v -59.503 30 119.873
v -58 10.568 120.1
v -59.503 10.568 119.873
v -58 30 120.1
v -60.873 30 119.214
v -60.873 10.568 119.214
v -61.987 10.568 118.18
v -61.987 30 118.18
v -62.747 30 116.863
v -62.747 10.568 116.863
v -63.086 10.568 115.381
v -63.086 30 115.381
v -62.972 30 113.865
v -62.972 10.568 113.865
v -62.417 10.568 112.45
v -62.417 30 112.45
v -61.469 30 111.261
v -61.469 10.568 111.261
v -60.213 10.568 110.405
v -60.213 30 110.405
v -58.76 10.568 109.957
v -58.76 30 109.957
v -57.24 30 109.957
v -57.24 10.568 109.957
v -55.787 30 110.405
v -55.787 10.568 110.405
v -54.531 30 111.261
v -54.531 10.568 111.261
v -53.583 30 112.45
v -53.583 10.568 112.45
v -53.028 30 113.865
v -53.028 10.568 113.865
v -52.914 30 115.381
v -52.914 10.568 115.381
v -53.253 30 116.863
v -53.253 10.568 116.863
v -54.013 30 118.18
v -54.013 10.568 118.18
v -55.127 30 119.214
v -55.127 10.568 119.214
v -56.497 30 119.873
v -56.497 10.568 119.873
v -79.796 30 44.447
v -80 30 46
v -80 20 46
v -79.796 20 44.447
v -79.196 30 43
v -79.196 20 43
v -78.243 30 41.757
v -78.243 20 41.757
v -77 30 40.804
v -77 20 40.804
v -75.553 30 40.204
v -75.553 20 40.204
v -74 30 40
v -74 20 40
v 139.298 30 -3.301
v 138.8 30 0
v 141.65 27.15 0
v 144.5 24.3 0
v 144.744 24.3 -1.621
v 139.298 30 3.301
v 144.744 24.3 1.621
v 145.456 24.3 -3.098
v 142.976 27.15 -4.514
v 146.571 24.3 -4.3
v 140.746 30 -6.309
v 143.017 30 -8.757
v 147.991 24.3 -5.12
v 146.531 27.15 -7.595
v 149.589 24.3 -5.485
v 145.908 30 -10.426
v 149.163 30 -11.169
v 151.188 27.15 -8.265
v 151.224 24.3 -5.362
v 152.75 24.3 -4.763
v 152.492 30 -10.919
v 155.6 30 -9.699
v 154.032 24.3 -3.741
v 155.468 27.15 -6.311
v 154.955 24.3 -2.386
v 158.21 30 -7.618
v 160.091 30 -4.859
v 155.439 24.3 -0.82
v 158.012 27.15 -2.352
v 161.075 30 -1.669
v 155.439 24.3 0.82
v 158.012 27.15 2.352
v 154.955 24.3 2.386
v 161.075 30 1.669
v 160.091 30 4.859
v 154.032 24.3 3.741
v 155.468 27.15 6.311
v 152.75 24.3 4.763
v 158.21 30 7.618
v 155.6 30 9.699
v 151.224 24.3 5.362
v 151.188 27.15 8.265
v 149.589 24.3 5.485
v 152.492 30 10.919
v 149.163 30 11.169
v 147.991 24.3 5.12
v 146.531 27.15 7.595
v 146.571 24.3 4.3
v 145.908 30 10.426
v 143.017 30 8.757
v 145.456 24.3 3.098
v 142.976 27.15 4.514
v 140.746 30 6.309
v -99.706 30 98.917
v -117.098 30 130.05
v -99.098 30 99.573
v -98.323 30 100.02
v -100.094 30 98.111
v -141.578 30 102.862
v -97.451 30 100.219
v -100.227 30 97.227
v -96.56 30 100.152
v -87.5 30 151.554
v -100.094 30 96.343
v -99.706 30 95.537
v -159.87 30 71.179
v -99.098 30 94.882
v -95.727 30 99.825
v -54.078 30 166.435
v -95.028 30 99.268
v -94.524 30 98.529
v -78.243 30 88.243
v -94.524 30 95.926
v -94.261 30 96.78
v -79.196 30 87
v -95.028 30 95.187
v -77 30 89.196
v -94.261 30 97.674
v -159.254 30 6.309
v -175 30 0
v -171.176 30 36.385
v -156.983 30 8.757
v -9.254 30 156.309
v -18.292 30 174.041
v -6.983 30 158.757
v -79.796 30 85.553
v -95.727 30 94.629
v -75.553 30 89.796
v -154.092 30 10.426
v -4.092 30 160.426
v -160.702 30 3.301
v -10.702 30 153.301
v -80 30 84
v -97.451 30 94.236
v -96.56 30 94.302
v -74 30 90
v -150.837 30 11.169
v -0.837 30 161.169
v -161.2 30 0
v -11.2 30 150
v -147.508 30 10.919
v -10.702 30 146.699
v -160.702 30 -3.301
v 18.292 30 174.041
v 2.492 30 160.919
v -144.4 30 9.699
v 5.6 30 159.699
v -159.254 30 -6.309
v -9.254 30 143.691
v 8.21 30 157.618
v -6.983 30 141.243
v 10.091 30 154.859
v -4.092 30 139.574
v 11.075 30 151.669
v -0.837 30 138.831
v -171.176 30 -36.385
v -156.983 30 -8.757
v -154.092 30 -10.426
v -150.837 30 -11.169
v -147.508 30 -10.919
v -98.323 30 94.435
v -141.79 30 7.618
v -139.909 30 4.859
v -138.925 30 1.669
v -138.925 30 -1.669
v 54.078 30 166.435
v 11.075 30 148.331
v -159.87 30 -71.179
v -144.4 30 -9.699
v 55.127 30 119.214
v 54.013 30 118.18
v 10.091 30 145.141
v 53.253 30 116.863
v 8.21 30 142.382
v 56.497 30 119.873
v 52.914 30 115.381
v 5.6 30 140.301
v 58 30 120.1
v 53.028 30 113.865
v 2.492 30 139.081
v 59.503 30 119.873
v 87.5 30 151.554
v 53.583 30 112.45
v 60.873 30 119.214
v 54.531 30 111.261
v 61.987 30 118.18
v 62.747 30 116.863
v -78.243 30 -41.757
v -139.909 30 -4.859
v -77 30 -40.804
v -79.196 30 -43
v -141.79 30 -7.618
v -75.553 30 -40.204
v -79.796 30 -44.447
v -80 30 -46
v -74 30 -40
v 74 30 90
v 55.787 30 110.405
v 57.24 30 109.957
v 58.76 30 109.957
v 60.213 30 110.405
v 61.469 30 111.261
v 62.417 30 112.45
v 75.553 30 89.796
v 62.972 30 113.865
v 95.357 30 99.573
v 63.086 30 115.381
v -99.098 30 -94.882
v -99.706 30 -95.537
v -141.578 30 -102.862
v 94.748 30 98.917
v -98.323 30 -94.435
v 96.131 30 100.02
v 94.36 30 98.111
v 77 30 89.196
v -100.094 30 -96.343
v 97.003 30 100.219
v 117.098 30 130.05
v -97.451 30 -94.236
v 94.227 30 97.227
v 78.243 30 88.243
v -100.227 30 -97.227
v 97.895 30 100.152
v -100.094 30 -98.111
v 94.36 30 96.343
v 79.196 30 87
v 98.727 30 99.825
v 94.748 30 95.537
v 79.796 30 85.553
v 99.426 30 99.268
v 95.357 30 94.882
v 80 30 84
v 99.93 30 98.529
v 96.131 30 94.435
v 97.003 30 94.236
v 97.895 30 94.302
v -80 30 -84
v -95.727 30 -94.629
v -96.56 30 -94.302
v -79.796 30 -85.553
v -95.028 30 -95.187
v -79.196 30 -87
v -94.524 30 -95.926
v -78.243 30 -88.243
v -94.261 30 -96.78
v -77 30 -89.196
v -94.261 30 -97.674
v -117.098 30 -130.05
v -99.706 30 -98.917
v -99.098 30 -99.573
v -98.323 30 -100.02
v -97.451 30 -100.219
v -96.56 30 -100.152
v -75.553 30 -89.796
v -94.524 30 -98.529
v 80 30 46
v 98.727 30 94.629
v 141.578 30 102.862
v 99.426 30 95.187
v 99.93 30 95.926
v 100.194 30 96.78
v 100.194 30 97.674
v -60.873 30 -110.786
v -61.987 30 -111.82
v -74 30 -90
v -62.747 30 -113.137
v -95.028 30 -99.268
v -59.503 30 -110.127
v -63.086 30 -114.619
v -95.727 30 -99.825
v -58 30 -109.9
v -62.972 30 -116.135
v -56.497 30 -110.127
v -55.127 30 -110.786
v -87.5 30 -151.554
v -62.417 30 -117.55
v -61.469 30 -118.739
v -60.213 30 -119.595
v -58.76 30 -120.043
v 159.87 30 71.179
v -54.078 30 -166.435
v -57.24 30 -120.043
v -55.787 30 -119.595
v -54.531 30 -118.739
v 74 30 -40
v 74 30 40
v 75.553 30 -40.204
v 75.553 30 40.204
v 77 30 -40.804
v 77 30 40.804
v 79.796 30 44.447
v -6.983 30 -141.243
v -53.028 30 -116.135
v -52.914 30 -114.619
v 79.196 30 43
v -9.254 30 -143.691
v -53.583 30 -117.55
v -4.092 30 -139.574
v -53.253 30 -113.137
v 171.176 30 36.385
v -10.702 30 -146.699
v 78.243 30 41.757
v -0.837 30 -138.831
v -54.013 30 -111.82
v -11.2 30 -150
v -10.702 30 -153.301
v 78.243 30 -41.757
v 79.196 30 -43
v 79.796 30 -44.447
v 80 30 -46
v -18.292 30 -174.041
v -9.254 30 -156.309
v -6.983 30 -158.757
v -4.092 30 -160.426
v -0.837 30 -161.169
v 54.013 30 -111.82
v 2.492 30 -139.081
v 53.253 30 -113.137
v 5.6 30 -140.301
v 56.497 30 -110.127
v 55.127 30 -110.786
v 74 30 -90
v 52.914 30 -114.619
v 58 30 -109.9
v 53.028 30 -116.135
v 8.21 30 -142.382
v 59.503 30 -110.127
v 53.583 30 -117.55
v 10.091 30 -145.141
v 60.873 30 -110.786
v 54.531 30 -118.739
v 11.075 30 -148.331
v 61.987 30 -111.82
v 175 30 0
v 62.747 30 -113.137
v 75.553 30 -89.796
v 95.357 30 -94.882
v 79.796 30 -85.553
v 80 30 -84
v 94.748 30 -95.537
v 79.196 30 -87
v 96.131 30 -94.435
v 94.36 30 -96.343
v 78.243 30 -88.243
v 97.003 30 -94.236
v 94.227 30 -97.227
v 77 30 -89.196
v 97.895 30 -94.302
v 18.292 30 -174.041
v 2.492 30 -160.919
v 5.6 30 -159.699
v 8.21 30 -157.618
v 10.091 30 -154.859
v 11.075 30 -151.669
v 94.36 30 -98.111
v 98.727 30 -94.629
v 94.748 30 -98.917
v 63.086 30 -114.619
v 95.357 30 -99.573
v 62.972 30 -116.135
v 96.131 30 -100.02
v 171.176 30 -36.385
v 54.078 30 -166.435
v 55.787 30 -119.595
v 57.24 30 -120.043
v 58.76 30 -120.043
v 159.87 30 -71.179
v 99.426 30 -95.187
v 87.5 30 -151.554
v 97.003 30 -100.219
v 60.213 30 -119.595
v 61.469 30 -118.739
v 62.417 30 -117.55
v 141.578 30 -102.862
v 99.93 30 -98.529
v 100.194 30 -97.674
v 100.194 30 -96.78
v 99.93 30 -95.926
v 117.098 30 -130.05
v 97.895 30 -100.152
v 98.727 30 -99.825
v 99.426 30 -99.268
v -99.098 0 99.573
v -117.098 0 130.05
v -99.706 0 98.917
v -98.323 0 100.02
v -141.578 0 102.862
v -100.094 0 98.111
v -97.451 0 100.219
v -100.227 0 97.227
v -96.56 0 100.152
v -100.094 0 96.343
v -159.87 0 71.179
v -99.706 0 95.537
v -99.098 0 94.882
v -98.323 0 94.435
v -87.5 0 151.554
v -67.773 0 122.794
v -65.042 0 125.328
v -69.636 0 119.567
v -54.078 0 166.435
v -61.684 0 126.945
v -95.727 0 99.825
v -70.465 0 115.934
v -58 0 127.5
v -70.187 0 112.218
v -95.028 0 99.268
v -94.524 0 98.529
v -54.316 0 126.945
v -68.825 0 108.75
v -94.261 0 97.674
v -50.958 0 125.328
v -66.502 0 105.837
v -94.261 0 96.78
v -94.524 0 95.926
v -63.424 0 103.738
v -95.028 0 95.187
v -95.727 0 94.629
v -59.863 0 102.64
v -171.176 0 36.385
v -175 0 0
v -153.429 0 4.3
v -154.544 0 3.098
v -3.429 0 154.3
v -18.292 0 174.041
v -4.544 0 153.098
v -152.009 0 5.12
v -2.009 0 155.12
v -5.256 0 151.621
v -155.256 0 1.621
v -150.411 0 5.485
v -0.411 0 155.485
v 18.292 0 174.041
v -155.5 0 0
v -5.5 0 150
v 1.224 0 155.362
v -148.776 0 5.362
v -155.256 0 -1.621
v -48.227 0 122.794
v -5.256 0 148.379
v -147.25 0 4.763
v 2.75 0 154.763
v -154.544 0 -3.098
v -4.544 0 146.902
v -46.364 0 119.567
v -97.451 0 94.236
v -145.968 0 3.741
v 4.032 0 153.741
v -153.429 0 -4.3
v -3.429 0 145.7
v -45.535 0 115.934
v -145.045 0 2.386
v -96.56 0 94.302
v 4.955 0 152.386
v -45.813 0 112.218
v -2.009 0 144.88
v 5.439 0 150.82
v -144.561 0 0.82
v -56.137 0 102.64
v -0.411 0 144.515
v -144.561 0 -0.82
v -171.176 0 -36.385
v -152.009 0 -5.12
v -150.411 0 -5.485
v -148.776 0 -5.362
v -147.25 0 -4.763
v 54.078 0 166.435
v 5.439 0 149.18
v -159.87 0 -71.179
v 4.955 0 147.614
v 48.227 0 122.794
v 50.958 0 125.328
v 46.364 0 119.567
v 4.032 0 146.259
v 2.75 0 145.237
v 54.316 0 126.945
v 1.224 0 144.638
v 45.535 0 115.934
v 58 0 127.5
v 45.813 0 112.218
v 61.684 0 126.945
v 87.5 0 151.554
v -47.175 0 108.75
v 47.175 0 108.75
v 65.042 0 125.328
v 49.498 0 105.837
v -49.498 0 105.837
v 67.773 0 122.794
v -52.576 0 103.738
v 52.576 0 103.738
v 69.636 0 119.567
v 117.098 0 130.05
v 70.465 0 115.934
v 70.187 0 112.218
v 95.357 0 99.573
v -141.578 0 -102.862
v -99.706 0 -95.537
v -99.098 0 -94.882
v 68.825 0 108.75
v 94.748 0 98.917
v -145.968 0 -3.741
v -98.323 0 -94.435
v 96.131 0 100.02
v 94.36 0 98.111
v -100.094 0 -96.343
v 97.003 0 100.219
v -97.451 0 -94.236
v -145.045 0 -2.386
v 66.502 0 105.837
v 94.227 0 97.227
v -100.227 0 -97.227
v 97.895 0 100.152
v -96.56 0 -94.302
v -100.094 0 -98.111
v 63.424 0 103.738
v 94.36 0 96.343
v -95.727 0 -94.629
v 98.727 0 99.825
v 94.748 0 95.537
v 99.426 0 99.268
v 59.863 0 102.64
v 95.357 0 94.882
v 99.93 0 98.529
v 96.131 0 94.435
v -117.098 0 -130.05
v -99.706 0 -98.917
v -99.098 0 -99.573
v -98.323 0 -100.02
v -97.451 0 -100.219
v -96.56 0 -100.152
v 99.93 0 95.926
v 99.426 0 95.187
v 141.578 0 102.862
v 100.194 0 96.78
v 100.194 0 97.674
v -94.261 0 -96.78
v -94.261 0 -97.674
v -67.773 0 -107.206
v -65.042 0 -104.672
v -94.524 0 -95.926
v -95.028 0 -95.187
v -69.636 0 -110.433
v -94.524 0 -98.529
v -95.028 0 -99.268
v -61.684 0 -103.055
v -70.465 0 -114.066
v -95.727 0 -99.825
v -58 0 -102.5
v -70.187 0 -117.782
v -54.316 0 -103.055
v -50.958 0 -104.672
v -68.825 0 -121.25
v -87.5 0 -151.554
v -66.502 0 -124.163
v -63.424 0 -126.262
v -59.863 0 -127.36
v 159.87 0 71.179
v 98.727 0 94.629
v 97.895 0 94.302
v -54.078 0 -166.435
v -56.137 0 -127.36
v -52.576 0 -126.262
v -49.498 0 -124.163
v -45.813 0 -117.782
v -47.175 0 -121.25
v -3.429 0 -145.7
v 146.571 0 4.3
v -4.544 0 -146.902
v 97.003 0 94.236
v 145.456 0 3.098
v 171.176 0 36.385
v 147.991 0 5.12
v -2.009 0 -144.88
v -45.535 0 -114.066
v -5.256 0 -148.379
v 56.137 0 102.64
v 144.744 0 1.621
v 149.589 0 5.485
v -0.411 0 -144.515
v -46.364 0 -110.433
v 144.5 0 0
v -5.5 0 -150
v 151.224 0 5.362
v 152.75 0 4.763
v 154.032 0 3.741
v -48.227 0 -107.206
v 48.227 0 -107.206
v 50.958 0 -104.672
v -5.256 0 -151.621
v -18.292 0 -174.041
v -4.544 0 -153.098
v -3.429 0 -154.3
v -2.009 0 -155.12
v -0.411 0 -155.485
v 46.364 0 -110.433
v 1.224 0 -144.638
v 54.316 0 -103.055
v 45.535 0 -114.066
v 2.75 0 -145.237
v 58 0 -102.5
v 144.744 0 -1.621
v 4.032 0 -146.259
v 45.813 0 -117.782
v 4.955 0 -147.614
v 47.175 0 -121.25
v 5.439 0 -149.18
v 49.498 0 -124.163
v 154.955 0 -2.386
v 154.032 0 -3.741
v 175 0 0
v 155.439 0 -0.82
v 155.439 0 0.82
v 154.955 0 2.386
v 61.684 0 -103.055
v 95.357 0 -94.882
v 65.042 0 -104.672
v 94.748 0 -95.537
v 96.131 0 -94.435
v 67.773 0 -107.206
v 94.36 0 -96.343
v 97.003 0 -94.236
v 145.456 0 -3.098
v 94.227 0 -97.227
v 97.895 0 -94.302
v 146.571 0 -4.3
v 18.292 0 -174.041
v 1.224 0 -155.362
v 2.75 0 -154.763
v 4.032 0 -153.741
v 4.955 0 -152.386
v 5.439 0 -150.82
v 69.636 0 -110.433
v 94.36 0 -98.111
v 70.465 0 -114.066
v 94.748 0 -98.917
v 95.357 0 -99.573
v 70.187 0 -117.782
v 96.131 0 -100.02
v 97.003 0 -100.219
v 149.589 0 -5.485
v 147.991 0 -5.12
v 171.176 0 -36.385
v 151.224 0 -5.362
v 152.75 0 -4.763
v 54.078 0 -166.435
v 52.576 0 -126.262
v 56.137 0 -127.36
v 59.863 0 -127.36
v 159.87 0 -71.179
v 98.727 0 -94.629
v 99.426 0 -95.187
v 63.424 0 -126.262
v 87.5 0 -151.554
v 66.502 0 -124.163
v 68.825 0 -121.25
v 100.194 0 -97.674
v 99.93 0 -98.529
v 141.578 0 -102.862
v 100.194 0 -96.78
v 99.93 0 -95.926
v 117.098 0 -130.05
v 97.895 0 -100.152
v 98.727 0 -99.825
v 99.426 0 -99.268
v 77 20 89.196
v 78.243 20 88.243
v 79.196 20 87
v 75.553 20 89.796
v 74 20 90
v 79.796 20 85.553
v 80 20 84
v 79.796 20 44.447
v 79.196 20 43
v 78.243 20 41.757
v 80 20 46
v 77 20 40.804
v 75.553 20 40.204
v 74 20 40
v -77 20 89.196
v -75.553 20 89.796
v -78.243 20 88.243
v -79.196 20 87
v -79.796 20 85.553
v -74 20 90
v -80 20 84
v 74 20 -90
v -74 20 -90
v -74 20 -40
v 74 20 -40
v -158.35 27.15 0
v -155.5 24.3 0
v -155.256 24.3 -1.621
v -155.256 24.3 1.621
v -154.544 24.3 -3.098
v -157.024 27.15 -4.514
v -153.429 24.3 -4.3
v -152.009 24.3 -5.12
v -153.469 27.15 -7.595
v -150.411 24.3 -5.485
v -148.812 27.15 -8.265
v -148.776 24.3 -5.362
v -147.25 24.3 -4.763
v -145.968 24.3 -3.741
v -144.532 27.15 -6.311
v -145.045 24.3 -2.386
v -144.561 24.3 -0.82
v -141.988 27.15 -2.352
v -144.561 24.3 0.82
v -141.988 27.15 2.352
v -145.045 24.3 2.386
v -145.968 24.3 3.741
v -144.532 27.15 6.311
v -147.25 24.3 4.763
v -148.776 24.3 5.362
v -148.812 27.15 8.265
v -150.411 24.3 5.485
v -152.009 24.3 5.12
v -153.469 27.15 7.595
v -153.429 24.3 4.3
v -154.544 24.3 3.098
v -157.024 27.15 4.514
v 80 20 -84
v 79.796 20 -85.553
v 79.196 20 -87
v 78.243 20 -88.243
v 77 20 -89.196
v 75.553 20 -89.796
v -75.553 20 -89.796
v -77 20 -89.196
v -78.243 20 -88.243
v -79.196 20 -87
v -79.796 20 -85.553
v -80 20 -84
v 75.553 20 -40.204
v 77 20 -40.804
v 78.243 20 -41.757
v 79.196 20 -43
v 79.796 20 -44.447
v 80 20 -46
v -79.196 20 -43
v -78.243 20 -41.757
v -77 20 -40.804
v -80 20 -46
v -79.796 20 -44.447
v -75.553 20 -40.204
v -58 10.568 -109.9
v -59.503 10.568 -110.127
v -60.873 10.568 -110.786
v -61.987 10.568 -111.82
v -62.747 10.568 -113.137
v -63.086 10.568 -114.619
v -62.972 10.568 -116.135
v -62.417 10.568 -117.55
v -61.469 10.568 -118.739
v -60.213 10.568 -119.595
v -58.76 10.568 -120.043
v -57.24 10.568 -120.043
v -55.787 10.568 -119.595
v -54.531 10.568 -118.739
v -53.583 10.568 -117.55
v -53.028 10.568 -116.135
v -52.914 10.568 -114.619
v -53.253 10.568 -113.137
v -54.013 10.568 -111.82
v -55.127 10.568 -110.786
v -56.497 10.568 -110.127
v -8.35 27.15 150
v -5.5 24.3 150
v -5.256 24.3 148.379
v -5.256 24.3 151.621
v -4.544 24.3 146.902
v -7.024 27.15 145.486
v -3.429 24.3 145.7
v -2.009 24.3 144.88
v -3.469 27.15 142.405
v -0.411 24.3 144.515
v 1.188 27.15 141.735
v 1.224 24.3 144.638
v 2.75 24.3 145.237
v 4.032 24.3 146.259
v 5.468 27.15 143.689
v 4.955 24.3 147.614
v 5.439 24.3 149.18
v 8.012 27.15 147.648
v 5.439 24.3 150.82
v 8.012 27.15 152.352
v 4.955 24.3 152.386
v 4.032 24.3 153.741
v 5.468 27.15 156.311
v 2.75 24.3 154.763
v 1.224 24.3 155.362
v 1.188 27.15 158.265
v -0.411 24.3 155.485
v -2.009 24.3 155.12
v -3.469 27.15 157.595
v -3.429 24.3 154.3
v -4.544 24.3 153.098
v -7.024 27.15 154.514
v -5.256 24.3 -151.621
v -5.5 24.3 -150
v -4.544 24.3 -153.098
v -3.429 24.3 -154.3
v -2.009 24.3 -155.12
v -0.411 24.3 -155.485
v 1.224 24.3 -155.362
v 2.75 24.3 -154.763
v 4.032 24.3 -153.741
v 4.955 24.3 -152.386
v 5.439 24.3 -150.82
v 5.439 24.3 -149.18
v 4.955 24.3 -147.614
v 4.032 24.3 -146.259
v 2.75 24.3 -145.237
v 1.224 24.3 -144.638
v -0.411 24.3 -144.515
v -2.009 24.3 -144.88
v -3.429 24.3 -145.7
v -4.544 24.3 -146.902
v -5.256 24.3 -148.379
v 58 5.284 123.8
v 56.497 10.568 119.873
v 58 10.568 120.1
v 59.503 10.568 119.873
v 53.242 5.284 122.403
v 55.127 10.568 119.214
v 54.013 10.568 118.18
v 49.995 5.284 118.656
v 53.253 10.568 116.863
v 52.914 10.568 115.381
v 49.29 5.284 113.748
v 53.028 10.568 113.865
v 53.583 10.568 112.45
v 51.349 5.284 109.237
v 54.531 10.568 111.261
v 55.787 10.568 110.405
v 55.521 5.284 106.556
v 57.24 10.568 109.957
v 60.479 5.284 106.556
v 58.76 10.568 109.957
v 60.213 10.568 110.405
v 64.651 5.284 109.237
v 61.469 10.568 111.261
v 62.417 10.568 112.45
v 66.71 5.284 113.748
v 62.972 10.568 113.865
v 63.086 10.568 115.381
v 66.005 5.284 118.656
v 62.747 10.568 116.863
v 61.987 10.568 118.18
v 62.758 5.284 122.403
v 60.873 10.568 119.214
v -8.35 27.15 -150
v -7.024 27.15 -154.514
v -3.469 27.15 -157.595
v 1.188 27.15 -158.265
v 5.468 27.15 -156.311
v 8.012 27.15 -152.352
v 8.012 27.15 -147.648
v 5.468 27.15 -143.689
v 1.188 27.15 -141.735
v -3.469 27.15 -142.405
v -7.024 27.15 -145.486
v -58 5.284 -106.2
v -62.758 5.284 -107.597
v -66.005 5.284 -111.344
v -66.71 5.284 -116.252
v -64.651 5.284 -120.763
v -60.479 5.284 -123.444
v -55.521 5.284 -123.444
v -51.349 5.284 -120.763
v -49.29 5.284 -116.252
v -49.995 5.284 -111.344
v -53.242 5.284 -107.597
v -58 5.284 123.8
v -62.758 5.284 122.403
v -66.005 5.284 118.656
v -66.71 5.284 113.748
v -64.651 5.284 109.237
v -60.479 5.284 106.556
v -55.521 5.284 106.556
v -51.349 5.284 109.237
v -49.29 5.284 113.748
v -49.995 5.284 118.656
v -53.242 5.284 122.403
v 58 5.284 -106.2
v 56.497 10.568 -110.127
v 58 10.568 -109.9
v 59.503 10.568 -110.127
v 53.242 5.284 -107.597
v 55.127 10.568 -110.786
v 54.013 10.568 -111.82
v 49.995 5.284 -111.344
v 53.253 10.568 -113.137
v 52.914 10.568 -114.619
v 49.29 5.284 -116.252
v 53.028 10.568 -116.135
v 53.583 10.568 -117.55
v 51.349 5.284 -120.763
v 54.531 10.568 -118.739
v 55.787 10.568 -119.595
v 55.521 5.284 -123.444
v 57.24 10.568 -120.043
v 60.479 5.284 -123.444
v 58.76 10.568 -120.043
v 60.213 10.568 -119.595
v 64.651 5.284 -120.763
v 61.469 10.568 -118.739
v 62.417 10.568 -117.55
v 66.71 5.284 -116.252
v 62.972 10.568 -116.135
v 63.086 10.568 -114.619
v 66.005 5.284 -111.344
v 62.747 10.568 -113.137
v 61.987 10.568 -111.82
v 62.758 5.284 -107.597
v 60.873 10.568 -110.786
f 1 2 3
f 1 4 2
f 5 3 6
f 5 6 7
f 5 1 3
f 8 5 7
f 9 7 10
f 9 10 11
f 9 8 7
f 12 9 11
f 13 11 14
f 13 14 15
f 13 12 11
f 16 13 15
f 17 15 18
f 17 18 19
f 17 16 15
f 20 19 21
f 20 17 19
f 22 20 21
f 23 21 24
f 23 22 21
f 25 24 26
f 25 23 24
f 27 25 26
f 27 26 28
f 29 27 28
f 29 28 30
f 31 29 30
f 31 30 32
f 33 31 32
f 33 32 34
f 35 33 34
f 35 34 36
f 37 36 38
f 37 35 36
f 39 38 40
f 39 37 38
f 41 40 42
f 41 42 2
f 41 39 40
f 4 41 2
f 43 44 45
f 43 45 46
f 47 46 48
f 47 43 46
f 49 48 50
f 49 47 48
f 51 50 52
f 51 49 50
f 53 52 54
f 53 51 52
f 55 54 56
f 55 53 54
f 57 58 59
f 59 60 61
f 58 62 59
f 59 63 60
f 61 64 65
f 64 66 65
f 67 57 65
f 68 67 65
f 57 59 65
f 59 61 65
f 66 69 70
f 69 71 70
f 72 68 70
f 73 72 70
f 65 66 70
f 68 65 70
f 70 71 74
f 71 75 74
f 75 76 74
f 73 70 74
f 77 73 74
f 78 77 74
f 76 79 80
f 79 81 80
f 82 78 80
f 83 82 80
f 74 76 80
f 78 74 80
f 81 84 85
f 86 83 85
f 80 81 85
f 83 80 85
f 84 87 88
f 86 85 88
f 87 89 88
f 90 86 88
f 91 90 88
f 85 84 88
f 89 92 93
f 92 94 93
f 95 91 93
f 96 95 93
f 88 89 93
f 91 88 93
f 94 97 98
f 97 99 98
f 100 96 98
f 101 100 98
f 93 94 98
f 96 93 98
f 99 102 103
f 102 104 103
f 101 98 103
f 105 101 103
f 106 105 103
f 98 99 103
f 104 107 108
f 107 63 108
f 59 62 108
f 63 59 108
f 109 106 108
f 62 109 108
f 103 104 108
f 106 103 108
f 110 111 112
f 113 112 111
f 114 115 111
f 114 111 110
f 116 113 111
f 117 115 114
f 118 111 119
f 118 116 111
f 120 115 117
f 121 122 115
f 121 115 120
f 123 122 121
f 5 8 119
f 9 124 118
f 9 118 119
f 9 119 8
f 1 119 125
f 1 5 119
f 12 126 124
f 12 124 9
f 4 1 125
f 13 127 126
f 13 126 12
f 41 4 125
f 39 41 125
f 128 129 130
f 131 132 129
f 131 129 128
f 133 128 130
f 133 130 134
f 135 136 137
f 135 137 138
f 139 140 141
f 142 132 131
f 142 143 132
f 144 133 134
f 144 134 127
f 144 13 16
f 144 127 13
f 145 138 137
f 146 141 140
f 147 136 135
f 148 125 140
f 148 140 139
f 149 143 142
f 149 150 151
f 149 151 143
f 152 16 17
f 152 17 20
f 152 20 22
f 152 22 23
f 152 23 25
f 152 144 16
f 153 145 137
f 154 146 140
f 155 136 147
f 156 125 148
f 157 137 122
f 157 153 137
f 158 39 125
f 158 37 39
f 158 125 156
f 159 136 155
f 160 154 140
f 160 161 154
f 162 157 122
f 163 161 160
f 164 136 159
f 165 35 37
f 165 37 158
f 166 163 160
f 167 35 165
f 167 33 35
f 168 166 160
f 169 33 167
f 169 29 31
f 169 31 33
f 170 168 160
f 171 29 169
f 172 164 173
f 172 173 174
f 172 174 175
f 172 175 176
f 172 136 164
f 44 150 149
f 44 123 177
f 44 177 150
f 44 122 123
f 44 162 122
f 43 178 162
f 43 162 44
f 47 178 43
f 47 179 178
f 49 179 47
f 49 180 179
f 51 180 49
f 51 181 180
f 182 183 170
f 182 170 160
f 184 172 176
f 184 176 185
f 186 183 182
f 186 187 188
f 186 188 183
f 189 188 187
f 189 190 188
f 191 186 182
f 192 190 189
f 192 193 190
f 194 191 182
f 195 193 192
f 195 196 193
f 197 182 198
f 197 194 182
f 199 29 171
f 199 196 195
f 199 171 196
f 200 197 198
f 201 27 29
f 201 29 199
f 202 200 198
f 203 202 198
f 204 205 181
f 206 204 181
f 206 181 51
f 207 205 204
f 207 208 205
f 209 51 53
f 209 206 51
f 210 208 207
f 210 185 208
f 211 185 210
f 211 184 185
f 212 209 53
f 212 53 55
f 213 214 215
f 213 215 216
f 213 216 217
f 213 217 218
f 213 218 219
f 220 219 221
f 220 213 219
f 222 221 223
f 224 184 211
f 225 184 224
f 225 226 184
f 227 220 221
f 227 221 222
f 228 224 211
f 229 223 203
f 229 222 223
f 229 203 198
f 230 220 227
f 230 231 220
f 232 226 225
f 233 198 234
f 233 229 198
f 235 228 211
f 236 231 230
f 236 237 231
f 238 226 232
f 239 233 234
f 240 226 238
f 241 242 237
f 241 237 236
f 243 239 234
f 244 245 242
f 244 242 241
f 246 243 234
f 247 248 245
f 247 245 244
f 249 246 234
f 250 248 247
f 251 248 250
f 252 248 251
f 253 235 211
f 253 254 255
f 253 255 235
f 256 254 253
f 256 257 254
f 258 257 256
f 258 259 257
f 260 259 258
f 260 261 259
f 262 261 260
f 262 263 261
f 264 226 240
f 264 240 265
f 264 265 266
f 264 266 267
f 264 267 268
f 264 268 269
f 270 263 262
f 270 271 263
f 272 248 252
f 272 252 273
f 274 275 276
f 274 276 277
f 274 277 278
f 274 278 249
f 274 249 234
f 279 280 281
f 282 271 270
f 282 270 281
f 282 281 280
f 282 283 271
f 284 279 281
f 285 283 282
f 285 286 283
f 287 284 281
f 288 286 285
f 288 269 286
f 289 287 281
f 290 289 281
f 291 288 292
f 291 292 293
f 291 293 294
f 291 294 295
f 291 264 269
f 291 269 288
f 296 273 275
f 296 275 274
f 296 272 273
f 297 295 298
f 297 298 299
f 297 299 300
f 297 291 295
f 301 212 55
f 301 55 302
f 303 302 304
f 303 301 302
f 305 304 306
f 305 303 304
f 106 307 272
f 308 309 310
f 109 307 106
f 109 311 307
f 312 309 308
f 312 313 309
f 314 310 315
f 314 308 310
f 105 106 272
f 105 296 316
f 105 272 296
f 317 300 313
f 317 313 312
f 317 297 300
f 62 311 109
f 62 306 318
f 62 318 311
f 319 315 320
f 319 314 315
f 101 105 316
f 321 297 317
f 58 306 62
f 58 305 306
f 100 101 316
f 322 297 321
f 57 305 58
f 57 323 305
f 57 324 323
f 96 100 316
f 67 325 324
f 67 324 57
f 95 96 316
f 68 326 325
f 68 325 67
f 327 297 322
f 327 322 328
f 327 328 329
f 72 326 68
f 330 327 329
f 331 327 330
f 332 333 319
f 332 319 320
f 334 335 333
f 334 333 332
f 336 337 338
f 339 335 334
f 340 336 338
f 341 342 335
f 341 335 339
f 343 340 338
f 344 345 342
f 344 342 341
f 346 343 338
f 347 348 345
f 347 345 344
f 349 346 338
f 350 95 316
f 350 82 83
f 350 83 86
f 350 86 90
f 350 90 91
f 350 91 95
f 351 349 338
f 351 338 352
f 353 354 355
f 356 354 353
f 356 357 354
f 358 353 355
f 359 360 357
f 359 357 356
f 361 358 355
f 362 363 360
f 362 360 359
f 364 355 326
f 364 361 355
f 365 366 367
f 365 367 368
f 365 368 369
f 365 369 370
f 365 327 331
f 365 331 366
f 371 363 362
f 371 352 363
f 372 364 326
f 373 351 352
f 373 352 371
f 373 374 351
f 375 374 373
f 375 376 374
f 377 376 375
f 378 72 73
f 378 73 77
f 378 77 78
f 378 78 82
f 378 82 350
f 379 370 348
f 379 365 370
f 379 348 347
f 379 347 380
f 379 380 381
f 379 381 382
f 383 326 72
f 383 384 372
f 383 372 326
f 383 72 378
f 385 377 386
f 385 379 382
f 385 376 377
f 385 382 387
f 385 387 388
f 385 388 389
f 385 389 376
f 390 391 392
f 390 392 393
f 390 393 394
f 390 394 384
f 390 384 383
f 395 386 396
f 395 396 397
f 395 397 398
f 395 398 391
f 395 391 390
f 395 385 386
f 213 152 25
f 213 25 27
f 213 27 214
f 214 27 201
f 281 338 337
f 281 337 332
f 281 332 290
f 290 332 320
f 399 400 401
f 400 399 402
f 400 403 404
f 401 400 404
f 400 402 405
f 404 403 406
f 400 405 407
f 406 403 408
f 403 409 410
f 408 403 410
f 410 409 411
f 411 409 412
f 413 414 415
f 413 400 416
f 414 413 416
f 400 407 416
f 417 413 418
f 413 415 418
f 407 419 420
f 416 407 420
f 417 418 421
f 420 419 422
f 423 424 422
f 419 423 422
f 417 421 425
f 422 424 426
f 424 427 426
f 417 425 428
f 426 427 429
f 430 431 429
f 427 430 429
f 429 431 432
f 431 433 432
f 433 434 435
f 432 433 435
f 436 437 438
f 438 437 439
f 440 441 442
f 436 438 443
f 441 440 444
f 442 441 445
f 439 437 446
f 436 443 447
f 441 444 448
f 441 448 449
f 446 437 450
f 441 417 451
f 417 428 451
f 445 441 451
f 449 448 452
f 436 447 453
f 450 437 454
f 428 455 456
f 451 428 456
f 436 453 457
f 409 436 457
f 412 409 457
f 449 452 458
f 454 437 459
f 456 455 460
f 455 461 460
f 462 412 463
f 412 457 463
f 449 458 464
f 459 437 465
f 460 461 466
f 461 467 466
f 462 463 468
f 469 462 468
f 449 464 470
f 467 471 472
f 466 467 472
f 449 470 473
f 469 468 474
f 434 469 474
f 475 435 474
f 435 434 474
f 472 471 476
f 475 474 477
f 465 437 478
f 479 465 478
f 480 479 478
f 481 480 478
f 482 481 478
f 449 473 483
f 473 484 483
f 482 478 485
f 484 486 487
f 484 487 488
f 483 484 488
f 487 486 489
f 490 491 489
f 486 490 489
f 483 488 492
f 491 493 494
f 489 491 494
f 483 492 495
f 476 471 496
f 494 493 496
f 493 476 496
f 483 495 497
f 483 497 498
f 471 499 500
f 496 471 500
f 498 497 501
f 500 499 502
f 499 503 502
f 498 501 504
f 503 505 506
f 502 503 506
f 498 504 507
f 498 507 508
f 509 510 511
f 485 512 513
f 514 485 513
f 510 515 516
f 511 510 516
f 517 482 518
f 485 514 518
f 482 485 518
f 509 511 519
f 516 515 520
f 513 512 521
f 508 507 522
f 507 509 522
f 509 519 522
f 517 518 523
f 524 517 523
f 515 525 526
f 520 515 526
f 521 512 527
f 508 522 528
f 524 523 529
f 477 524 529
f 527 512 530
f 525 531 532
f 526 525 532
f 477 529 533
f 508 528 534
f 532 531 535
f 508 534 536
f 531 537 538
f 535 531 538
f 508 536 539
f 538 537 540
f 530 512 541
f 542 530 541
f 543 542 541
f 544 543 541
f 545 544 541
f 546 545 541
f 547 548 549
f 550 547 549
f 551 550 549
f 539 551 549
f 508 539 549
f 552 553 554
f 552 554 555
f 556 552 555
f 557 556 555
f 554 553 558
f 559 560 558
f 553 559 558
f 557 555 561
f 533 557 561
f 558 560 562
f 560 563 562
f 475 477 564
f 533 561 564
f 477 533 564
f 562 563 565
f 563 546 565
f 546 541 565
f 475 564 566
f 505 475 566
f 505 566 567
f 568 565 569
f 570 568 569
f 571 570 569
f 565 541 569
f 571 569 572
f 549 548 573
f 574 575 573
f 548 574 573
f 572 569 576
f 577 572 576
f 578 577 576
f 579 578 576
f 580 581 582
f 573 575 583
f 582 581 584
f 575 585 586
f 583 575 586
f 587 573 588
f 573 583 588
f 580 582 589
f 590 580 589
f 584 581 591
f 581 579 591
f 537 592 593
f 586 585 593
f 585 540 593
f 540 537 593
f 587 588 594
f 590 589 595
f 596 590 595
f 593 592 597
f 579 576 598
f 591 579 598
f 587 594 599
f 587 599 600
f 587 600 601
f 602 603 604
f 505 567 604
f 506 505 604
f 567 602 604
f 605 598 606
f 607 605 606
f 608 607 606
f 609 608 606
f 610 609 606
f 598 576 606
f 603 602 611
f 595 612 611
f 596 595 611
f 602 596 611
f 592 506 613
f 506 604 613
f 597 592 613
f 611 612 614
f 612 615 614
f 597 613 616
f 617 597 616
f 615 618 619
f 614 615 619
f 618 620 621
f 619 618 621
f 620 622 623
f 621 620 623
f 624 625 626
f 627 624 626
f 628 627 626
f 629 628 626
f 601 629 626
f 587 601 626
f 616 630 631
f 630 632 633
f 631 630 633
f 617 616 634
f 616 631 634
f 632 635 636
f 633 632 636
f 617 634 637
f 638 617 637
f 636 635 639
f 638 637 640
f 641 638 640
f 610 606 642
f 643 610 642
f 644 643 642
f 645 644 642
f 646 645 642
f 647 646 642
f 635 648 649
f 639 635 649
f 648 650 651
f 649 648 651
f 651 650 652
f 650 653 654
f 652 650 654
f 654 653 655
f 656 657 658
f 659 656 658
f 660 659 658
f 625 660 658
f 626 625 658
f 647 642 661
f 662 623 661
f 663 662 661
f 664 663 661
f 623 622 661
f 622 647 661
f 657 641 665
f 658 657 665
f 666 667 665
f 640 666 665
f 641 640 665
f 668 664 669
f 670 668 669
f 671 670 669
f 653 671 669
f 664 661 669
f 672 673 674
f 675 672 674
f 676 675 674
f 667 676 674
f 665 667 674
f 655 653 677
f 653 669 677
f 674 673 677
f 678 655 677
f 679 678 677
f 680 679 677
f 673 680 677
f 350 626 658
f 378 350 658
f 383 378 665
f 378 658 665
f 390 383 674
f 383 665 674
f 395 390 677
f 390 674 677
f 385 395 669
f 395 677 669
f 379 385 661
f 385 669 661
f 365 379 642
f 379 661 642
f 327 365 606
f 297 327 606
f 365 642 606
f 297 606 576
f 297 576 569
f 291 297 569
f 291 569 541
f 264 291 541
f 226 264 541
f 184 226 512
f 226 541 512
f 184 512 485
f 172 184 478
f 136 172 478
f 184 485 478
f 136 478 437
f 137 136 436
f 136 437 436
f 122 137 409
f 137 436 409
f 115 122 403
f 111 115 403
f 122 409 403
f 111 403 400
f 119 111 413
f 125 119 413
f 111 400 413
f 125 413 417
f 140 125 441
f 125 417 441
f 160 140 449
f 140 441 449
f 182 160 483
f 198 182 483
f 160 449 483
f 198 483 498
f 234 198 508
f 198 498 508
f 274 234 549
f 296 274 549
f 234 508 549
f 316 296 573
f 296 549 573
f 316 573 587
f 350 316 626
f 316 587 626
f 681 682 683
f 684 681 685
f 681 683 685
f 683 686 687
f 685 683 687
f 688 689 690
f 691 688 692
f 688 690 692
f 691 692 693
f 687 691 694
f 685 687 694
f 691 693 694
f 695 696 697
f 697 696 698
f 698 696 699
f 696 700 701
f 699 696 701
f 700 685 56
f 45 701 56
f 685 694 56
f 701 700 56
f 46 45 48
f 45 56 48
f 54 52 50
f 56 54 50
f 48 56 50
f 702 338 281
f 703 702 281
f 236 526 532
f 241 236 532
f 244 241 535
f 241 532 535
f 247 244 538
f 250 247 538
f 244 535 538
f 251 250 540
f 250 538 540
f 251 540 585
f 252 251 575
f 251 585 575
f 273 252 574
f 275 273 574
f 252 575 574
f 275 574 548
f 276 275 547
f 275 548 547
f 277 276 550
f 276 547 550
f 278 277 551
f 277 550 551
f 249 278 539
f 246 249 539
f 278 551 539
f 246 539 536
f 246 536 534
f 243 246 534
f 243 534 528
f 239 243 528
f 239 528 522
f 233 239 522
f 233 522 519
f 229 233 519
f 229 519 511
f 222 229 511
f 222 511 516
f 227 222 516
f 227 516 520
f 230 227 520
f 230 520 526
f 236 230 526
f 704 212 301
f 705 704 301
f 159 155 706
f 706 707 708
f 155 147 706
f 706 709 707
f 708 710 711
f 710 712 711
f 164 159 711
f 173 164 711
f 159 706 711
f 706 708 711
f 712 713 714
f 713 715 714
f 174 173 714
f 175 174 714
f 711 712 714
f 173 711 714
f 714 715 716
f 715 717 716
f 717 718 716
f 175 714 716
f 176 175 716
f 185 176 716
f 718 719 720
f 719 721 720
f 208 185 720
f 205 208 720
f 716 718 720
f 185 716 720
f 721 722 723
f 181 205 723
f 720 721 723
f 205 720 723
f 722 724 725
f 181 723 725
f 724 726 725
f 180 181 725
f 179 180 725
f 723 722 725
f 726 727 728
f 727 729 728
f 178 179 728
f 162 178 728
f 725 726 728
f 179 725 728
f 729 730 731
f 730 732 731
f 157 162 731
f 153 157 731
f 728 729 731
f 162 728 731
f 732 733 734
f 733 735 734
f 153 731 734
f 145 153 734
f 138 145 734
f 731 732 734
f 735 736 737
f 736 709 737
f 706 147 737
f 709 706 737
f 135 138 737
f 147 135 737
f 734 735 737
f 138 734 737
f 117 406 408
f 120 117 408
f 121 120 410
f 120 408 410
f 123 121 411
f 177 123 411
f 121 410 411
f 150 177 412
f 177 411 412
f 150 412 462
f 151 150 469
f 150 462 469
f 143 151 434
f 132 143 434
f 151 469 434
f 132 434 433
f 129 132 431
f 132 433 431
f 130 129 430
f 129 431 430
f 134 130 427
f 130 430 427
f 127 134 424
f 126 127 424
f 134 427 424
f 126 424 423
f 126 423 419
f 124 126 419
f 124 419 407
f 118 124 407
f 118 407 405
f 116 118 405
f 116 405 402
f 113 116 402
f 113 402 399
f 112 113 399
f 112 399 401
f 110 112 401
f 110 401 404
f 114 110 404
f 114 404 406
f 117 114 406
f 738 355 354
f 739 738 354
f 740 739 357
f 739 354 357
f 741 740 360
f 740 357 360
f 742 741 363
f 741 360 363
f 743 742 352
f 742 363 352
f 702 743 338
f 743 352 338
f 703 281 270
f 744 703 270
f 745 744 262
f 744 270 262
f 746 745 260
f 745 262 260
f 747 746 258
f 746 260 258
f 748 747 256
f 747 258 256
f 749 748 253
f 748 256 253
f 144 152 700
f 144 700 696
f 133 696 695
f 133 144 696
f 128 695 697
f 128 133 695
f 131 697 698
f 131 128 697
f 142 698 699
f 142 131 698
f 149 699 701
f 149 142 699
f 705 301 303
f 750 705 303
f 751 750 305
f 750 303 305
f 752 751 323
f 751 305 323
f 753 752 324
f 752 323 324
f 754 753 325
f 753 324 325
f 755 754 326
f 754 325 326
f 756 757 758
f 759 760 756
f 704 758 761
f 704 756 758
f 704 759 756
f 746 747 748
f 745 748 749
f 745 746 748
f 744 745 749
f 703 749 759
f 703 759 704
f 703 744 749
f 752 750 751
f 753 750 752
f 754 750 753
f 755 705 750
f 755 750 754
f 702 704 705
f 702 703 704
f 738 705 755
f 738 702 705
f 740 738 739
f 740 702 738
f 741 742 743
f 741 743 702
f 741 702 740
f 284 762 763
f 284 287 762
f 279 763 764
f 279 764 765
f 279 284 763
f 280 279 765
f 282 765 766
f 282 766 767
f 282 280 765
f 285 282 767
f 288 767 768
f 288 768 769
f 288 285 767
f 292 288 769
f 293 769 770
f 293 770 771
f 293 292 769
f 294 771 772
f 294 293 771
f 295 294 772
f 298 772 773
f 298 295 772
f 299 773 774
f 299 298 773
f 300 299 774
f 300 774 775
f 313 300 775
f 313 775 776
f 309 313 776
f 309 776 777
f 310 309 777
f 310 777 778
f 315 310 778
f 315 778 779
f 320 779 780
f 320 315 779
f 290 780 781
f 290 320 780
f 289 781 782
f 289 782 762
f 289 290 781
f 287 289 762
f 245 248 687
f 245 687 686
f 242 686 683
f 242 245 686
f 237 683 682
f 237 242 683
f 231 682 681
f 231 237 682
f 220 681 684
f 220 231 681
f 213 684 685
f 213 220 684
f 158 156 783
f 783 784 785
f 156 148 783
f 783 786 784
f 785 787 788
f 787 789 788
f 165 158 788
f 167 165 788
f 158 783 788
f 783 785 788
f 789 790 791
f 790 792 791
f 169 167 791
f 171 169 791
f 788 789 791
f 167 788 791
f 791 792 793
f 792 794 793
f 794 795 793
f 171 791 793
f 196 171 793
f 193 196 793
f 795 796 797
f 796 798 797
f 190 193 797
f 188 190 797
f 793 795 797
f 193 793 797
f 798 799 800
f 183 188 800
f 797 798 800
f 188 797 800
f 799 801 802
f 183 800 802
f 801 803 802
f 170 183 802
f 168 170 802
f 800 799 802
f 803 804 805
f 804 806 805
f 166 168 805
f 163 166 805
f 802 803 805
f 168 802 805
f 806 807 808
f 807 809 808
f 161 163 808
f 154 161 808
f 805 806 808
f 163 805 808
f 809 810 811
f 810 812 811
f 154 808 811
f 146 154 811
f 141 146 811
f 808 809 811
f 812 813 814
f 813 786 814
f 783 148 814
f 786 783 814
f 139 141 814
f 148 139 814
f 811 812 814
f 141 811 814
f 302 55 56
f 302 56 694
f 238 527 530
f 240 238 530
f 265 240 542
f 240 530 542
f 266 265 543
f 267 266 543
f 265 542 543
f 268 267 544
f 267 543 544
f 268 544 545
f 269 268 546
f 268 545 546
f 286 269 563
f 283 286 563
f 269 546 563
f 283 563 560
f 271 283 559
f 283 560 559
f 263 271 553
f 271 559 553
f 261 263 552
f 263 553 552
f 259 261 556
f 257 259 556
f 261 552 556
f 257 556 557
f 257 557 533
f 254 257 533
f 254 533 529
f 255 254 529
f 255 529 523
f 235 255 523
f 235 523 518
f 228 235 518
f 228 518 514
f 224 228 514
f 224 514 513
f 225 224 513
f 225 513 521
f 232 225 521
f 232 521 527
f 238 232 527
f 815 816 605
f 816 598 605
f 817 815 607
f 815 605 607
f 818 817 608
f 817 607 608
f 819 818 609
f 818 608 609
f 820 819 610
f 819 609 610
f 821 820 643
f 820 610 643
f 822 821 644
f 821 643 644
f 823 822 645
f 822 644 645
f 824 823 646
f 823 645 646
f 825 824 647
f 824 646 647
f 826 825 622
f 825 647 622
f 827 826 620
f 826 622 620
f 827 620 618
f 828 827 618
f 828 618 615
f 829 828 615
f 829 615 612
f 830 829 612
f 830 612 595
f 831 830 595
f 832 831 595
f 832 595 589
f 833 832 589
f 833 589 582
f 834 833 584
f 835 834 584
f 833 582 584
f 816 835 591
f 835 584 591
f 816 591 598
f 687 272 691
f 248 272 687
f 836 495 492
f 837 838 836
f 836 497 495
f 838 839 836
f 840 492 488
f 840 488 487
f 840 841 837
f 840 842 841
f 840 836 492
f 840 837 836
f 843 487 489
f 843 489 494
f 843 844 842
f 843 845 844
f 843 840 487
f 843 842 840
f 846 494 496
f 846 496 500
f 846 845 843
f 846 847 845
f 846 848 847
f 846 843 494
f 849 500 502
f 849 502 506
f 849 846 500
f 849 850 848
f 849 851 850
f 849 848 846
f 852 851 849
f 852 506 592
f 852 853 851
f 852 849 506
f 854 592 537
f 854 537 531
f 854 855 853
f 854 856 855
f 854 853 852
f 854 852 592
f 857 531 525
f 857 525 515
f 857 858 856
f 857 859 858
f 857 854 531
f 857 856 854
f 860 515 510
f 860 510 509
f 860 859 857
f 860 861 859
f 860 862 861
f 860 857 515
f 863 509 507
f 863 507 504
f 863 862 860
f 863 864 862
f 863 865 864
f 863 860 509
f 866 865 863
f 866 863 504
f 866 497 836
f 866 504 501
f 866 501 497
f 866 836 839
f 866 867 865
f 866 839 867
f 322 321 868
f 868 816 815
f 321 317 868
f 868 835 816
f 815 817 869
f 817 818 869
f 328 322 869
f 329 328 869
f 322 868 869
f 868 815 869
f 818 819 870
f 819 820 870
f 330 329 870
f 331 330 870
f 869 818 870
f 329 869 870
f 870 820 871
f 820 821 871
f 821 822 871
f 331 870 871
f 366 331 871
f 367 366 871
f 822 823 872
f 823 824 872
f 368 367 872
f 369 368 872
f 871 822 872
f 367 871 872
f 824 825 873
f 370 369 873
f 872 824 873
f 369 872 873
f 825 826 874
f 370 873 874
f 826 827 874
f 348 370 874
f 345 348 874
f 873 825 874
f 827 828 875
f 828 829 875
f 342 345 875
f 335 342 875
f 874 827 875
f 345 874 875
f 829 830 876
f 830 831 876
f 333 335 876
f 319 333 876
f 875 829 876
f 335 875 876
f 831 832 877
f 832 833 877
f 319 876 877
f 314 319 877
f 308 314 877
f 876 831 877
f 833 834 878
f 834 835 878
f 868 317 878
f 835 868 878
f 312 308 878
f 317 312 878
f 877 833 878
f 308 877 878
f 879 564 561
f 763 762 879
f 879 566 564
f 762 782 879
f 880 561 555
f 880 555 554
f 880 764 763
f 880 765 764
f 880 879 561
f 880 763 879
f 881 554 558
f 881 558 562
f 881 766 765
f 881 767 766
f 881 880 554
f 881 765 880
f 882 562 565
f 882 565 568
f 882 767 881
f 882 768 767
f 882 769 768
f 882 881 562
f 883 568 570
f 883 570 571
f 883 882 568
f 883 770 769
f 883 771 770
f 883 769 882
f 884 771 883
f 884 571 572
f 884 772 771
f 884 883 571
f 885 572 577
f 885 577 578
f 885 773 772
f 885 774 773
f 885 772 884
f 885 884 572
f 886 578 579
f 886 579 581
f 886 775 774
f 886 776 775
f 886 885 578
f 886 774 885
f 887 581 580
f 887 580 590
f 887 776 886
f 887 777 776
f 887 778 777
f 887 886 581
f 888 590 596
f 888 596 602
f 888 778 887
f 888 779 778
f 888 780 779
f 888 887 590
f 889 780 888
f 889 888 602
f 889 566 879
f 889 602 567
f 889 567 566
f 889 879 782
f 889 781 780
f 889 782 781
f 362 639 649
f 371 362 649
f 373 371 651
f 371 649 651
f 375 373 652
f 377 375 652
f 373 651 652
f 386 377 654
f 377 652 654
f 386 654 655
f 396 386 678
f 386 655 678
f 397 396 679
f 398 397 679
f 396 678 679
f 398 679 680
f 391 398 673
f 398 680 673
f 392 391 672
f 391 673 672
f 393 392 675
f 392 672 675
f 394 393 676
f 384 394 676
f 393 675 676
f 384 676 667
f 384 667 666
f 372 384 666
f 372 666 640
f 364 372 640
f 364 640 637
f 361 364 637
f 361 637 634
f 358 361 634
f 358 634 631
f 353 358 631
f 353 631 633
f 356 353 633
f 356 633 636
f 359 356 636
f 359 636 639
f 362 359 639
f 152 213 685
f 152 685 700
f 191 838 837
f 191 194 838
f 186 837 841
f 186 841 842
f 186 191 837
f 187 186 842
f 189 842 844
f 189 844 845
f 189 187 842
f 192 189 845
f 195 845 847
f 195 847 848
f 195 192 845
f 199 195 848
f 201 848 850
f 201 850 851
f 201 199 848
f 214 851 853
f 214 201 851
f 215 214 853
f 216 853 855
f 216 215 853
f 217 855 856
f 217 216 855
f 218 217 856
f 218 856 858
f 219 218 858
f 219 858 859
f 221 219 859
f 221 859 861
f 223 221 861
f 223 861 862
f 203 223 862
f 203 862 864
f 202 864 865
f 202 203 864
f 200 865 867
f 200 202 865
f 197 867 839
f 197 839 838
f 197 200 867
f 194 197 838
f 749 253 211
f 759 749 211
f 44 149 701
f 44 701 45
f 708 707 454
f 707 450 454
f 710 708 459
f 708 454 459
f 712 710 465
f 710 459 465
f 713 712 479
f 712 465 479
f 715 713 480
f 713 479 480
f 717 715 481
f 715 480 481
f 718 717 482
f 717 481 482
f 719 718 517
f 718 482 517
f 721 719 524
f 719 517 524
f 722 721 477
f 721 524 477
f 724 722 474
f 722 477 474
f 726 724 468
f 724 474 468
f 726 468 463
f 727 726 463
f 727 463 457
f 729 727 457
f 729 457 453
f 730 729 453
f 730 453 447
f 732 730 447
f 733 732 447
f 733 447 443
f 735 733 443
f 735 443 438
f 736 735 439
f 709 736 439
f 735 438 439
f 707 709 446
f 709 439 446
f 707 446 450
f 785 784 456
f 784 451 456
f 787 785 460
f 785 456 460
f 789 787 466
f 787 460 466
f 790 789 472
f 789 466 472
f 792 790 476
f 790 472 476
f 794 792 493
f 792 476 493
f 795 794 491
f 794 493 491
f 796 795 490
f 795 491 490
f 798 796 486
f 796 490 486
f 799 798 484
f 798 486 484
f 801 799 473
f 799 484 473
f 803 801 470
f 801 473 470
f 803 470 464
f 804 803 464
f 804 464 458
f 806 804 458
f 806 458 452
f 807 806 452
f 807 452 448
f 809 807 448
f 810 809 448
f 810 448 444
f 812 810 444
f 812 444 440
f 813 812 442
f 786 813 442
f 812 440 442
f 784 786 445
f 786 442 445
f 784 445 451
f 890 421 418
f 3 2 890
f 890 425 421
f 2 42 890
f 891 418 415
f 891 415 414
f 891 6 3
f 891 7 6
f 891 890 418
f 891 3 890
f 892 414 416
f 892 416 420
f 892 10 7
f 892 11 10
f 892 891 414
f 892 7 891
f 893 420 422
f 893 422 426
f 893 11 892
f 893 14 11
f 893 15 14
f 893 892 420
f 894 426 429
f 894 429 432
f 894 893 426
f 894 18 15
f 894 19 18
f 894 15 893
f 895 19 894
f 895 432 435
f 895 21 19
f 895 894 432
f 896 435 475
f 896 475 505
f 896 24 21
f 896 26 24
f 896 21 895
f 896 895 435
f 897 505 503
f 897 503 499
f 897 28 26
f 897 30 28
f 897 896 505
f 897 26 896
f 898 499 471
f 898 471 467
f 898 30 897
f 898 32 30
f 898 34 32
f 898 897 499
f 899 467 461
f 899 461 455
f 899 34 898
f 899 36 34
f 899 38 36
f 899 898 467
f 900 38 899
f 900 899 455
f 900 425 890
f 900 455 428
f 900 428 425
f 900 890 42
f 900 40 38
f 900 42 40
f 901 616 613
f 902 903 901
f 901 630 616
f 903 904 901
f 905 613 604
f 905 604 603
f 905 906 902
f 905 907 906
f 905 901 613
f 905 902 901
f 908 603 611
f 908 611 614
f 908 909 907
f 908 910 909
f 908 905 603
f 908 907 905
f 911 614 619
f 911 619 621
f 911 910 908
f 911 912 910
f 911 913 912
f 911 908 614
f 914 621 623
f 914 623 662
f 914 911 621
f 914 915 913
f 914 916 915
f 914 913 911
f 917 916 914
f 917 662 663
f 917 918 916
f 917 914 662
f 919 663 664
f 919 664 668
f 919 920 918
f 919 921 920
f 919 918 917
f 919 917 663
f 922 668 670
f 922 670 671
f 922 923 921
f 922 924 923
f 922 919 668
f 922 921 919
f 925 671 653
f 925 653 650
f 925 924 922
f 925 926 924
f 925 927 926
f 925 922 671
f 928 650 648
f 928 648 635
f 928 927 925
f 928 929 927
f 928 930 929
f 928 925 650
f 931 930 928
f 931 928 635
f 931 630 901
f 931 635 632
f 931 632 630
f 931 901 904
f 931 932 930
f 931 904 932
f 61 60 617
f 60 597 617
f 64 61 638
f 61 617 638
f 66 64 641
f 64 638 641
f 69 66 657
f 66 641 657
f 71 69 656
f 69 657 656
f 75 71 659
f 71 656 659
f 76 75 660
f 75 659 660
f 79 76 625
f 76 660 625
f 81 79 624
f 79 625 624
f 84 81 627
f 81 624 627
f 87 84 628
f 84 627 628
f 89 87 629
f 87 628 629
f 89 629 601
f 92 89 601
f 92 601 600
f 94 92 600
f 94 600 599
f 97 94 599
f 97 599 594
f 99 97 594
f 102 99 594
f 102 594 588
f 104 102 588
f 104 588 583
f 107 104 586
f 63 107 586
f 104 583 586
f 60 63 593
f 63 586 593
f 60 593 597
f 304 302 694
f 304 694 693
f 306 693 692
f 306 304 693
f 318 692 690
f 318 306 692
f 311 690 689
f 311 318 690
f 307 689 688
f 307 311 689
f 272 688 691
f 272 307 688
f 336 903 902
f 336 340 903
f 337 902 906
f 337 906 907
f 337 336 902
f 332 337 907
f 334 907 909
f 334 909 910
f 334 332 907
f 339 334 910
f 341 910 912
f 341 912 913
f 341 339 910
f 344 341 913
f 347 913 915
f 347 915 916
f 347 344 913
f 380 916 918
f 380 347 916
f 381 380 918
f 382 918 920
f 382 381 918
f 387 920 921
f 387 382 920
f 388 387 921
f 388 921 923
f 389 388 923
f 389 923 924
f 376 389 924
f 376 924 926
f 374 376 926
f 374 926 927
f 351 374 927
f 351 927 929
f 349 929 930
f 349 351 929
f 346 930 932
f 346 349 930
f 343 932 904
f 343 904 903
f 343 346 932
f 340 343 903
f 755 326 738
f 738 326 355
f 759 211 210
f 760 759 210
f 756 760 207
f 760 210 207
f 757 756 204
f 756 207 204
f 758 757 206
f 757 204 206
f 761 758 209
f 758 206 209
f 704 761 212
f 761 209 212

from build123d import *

# Parameters (mm, degrees)
SKETCH1_R                              = 175
BOSS_EXTRUDE1_DEPTH                    = 30
CSK_FOR_M10_SFHCS1_D                   = 11
CSK_FOR_M10_SFHCS1_CSINK_D             = 22.4
CSK_FOR_M10_SFHCS1_CSINK_ANGLE         = 90
F_6_0MM_DOWEL_HOLE1_D                  = 6
CUT_EXTRUDE2_DEPTH                     = 10
TAP_DRILL_FOR_M12X1_75_TAP1_AT_2_COUNT = 2
TAP_DRILL_FOR_M12X1_75_TAP1_AT_2_PITCH = 116
TAP_DRILL_FOR_M12X1_75_TAP1_AT_3_COUNT = 2
TAP_DRILL_FOR_M12X1_75_TAP1_AT_3_PITCH = 257.596583828
TAP_DRILL_FOR_M12X1_75_TAP1_AT_4_COUNT = 2
TAP_DRILL_FOR_M12X1_75_TAP1_AT_4_PITCH = 230


with BuildPart() as part:
    # Sketch1 → Boss-Extrude1 (new body)
    with BuildSketch(Plane(origin=(0, 0, 0), x_dir=(1, 0, 0), z_dir=(0, 1, 0))):
        Circle(SKETCH1_R)
    extrude(amount=BOSS_EXTRUDE1_DEPTH)

    # CSK for M10 SFHCS1 (through all)
    with Locations(Plane(origin=(0, 30, 0), x_dir=(1, 0, 0), z_dir=(0, 1, 0))):
        with Locations((-150, 0), (0, -150), (150, 0), (0, 150)):
            CounterSinkHole(CSK_FOR_M10_SFHCS1_D / 2, CSK_FOR_M10_SFHCS1_CSINK_D / 2, counter_sink_angle=CSK_FOR_M10_SFHCS1_CSINK_ANGLE)

    # Ø6.0mm Dowel Hole1 (through all)
    with Locations(Plane(origin=(0, 30, 0), x_dir=(1, 0, 0), z_dir=(0, 1, 0))):
        with Locations((-97.227182413, -97.227182413), (97.227182413, -97.227182413), (97.227182413, 97.227182413), (-97.227182413, 97.227182413)):
            Hole(F_6_0MM_DOWEL_HOLE1_D / 2)

    # Sketch14 → Cut-Extrude2 (cut)
    with BuildSketch(Plane(origin=(0, 30, 0), x_dir=(1, 0, 0), z_dir=(0, 1, 0))):
        with BuildLine():
            Line((-74, -40), (74, -40))
            ThreePointArc((74, -40), (78.242640687, -41.757359313), (80, -46))
            Line((80, -46), (80, -84))
            ThreePointArc((80, -84), (78.242640687, -88.242640687), (74, -90))
            Line((74, -90), (-74, -90))
            ThreePointArc((-74, -90), (-78.242640687, -88.242640687), (-80, -84))
            Line((-80, -84), (-80, -46))
            ThreePointArc((-80, -46), (-78.242640687, -41.757359313), (-74, -40))
        make_face()
        with BuildLine():
            Line((80, 46), (80, 84))
            ThreePointArc((80, 84), (78.242640687, 88.242640687), (74, 90))
            Line((74, 90), (-74, 90))
            ThreePointArc((-74, 90), (-78.242640687, 88.242640687), (-80, 84))
            Line((-80, 84), (-80, 46))
            ThreePointArc((-80, 46), (-78.242640687, 41.757359313), (-74, 40))
            Line((-74, 40), (74, 40))
            ThreePointArc((74, 40), (78.242640687, 41.757359313), (80, 46))
        make_face()
    extrude(amount=-CUT_EXTRUDE2_DEPTH, mode=Mode.SUBTRACT)

    # Sketch21 → Tap Drill for M12x1.75 Tap1 (revolve, cut)
    with BuildSketch(Plane(origin=(-58, 30, -115), x_dir=(0, 0, 1), z_dir=(1, 0, 0))):
        Polygon((0, 0), (0, 30), (12.5, 30), (5.1, 19.43170475), (5.1, 0), align=None)
    tap_drill_for_m12x1_75_tap1 = revolve(axis=Axis((-58, 36.35, -115), (0, -1, 0)), mode=Mode.SUBTRACT)

    # Tap Drill for M12x1.75 Tap1 at 2: Tap Drill for M12x1.75 Tap1 ×2
    with Locations(*[(i * TAP_DRILL_FOR_M12X1_75_TAP1_AT_2_PITCH, 0, 0) for i in range(1, TAP_DRILL_FOR_M12X1_75_TAP1_AT_2_COUNT)]):
        add(tap_drill_for_m12x1_75_tap1, mode=Mode.SUBTRACT)

    # Tap Drill for M12x1.75 Tap1 at 3: Tap Drill for M12x1.75 Tap1 ×2
    with Locations(*[Vector(0.450316531, 0, 0.892868984) * (i * TAP_DRILL_FOR_M12X1_75_TAP1_AT_3_PITCH) for i in range(1, TAP_DRILL_FOR_M12X1_75_TAP1_AT_3_COUNT)]):
        add(tap_drill_for_m12x1_75_tap1, mode=Mode.SUBTRACT)

    # Tap Drill for M12x1.75 Tap1 at 4: Tap Drill for M12x1.75 Tap1 ×2
    with Locations(*[(0, 0, i * TAP_DRILL_FOR_M12X1_75_TAP1_AT_4_PITCH) for i in range(1, TAP_DRILL_FOR_M12X1_75_TAP1_AT_4_COUNT)]):
        add(tap_drill_for_m12x1_75_tap1, mode=Mode.SUBTRACT)


solid = part.part
